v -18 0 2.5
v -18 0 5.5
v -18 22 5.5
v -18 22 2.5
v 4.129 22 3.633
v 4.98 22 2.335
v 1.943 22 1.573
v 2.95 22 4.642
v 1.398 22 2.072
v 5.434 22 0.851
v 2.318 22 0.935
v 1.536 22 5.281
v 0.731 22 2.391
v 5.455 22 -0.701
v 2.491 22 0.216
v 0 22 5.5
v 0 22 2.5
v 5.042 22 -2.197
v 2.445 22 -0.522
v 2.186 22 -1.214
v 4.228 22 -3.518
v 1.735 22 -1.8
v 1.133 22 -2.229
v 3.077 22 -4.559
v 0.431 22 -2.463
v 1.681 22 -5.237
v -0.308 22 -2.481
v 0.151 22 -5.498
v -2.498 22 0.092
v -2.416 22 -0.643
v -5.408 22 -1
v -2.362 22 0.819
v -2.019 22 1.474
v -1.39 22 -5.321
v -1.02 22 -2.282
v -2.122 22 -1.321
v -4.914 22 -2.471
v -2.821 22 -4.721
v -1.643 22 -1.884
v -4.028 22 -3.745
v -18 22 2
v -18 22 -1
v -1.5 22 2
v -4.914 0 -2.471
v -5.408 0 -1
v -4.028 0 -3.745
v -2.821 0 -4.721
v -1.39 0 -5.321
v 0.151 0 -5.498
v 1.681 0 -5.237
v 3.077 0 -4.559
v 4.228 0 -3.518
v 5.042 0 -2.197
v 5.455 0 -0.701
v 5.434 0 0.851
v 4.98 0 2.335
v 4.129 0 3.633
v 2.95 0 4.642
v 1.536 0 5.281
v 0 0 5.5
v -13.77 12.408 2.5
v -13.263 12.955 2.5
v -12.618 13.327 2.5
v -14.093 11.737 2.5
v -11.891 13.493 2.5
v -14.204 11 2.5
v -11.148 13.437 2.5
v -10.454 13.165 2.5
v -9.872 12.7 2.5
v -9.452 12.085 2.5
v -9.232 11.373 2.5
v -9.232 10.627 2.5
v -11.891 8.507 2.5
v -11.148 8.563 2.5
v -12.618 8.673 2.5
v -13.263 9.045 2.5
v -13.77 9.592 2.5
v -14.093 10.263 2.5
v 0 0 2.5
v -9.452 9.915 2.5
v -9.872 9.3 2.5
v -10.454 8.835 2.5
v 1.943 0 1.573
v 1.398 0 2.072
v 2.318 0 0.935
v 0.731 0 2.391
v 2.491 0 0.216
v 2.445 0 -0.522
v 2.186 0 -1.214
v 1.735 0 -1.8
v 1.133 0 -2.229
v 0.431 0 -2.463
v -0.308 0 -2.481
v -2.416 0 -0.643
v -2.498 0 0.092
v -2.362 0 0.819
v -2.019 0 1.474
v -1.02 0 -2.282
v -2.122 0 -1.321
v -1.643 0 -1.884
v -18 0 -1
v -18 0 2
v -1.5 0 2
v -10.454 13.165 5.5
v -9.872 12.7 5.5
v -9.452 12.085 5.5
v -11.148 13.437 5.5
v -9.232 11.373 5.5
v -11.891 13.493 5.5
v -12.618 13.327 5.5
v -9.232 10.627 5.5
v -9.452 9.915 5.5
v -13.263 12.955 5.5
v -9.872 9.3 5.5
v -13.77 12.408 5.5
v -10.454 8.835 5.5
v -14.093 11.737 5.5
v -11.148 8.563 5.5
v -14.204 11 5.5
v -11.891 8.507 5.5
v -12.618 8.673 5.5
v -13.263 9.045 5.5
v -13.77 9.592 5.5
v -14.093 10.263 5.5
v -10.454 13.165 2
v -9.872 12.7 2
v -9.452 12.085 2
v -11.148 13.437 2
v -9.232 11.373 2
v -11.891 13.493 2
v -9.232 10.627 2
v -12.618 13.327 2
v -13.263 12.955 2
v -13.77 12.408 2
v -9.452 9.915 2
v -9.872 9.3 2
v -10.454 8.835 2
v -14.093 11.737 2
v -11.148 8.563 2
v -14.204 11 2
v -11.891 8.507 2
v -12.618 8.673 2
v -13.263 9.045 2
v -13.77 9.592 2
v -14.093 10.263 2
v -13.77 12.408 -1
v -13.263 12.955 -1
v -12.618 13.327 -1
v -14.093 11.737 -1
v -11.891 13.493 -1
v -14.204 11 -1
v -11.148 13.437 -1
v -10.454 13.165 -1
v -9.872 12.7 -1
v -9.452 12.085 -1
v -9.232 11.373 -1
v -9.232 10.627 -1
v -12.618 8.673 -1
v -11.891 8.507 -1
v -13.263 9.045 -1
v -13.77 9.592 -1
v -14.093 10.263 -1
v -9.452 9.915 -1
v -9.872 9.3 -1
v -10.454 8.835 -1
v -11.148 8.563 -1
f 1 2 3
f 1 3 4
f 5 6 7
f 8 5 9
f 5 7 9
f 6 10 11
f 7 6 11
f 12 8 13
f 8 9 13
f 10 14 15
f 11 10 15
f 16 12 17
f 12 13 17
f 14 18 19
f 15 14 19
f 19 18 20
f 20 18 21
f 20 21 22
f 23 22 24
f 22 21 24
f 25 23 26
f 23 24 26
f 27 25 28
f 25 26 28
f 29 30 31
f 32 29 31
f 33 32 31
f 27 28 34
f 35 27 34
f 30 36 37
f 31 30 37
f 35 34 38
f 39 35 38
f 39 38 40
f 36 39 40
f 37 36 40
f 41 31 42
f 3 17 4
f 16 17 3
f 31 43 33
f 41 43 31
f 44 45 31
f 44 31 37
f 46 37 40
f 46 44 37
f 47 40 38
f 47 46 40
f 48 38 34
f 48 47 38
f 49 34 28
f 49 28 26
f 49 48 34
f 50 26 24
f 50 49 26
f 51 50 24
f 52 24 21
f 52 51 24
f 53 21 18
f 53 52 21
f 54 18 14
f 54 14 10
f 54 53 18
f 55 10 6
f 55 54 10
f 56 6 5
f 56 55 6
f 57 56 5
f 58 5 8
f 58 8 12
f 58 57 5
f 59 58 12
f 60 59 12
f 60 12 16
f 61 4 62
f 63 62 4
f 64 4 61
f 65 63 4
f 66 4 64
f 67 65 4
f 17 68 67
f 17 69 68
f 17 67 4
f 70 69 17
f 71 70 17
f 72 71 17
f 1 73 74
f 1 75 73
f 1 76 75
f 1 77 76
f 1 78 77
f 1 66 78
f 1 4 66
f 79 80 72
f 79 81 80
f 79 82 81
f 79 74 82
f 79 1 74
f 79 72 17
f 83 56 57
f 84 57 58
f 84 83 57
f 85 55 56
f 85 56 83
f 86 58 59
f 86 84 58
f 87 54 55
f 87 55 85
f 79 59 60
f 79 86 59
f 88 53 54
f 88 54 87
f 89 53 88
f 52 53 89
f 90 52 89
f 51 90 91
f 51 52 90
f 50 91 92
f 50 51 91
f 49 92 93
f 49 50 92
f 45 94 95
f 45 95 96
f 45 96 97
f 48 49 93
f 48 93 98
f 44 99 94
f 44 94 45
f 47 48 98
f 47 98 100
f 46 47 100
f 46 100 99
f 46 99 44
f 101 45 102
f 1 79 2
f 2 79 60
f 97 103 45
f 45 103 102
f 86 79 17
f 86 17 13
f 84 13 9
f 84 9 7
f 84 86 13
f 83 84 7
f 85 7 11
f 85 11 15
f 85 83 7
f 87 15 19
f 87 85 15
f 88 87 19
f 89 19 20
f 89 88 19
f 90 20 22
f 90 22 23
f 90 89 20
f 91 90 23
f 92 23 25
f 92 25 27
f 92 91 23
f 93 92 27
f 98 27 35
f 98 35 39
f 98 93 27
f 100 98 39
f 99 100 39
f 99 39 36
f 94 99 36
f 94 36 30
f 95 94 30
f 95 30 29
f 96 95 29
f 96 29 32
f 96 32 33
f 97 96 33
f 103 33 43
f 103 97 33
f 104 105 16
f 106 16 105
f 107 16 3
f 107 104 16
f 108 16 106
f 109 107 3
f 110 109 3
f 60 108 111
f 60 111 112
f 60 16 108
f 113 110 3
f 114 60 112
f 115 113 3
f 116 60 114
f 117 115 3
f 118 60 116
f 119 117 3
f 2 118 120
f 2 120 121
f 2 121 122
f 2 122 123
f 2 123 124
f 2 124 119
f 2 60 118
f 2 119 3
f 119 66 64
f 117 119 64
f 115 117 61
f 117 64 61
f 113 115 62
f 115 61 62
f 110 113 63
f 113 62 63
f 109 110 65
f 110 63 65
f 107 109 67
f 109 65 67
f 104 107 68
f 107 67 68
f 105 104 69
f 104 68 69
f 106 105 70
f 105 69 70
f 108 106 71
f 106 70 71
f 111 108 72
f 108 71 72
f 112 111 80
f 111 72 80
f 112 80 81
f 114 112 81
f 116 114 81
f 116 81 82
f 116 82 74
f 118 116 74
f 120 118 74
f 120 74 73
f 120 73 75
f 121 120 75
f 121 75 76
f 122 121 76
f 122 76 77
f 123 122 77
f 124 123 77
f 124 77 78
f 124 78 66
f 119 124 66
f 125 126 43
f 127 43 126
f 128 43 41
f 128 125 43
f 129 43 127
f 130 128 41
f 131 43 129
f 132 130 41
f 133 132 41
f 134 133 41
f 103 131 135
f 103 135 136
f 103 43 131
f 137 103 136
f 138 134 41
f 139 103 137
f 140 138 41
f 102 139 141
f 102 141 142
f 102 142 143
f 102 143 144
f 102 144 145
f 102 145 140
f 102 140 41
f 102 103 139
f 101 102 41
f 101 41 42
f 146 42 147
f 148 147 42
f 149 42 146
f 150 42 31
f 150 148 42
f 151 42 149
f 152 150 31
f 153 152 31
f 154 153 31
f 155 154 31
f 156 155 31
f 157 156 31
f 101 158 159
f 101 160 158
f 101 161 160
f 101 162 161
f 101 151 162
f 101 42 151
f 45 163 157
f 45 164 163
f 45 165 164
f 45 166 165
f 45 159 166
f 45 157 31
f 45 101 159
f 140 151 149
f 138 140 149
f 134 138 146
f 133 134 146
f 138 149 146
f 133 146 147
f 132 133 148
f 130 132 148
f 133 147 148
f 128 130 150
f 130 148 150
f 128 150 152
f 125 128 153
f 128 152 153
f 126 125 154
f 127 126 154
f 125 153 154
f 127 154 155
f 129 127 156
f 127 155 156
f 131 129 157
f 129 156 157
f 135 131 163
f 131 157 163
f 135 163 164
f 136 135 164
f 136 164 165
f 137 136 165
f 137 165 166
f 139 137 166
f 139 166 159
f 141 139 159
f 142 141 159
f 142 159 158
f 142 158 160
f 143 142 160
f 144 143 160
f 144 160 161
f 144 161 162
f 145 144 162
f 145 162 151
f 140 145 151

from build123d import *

# Parameters (mm, degrees)
SALIENTE_EXTRUIR1_DEPTH = 22
CROQUIS2_R              = 2.5
CORTAR_EXTRUIR1_DEPTH   = 15


with BuildPart() as part:
    # Croquis1 → Saliente-Extruir1 (new body)
    with BuildSketch(Plane(origin=(0, 0, 0), x_dir=(1, 0, 0), z_dir=(0, 1, 0))):
        with BuildLine():
            Line((0, -5.5), (-18, -5.5))
            Line((-18, -5.5), (-18, -2.5))
            Line((-18, -2.5), (-7.399590065, -2.5))
            Line((-7.399590065, -2.5), (0, -2.5))
            ThreePointArc((0, -2.5), (0.790569415, 2.371708245), (-1.5, -2))
            Line((-1.5, -2), (-6.46658194, -2))
            Line((-6.46658194, -2), (-18, -2))
            Line((-18, -2), (-18, 1))
            Line((-18, 1), (-5.408326913, 1))
            ThreePointArc((-5.408326913, 1), (4.227883631, 3.51781182), (0, -5.5))
        make_face()
    extrude(amount=SALIENTE_EXTRUIR1_DEPTH)

    # Croquis2 → Cortar-Extruir1 (cut)
    with BuildSketch(Plane(origin=(0, 0, -1), x_dir=(-1, 0, 0), z_dir=(0, 0, -1))):
        with Locations((11.704163457, 11)):
            Circle(CROQUIS2_R)
    extrude(amount=-CORTAR_EXTRUIR1_DEPTH, mode=Mode.SUBTRACT)


solid = part.part
